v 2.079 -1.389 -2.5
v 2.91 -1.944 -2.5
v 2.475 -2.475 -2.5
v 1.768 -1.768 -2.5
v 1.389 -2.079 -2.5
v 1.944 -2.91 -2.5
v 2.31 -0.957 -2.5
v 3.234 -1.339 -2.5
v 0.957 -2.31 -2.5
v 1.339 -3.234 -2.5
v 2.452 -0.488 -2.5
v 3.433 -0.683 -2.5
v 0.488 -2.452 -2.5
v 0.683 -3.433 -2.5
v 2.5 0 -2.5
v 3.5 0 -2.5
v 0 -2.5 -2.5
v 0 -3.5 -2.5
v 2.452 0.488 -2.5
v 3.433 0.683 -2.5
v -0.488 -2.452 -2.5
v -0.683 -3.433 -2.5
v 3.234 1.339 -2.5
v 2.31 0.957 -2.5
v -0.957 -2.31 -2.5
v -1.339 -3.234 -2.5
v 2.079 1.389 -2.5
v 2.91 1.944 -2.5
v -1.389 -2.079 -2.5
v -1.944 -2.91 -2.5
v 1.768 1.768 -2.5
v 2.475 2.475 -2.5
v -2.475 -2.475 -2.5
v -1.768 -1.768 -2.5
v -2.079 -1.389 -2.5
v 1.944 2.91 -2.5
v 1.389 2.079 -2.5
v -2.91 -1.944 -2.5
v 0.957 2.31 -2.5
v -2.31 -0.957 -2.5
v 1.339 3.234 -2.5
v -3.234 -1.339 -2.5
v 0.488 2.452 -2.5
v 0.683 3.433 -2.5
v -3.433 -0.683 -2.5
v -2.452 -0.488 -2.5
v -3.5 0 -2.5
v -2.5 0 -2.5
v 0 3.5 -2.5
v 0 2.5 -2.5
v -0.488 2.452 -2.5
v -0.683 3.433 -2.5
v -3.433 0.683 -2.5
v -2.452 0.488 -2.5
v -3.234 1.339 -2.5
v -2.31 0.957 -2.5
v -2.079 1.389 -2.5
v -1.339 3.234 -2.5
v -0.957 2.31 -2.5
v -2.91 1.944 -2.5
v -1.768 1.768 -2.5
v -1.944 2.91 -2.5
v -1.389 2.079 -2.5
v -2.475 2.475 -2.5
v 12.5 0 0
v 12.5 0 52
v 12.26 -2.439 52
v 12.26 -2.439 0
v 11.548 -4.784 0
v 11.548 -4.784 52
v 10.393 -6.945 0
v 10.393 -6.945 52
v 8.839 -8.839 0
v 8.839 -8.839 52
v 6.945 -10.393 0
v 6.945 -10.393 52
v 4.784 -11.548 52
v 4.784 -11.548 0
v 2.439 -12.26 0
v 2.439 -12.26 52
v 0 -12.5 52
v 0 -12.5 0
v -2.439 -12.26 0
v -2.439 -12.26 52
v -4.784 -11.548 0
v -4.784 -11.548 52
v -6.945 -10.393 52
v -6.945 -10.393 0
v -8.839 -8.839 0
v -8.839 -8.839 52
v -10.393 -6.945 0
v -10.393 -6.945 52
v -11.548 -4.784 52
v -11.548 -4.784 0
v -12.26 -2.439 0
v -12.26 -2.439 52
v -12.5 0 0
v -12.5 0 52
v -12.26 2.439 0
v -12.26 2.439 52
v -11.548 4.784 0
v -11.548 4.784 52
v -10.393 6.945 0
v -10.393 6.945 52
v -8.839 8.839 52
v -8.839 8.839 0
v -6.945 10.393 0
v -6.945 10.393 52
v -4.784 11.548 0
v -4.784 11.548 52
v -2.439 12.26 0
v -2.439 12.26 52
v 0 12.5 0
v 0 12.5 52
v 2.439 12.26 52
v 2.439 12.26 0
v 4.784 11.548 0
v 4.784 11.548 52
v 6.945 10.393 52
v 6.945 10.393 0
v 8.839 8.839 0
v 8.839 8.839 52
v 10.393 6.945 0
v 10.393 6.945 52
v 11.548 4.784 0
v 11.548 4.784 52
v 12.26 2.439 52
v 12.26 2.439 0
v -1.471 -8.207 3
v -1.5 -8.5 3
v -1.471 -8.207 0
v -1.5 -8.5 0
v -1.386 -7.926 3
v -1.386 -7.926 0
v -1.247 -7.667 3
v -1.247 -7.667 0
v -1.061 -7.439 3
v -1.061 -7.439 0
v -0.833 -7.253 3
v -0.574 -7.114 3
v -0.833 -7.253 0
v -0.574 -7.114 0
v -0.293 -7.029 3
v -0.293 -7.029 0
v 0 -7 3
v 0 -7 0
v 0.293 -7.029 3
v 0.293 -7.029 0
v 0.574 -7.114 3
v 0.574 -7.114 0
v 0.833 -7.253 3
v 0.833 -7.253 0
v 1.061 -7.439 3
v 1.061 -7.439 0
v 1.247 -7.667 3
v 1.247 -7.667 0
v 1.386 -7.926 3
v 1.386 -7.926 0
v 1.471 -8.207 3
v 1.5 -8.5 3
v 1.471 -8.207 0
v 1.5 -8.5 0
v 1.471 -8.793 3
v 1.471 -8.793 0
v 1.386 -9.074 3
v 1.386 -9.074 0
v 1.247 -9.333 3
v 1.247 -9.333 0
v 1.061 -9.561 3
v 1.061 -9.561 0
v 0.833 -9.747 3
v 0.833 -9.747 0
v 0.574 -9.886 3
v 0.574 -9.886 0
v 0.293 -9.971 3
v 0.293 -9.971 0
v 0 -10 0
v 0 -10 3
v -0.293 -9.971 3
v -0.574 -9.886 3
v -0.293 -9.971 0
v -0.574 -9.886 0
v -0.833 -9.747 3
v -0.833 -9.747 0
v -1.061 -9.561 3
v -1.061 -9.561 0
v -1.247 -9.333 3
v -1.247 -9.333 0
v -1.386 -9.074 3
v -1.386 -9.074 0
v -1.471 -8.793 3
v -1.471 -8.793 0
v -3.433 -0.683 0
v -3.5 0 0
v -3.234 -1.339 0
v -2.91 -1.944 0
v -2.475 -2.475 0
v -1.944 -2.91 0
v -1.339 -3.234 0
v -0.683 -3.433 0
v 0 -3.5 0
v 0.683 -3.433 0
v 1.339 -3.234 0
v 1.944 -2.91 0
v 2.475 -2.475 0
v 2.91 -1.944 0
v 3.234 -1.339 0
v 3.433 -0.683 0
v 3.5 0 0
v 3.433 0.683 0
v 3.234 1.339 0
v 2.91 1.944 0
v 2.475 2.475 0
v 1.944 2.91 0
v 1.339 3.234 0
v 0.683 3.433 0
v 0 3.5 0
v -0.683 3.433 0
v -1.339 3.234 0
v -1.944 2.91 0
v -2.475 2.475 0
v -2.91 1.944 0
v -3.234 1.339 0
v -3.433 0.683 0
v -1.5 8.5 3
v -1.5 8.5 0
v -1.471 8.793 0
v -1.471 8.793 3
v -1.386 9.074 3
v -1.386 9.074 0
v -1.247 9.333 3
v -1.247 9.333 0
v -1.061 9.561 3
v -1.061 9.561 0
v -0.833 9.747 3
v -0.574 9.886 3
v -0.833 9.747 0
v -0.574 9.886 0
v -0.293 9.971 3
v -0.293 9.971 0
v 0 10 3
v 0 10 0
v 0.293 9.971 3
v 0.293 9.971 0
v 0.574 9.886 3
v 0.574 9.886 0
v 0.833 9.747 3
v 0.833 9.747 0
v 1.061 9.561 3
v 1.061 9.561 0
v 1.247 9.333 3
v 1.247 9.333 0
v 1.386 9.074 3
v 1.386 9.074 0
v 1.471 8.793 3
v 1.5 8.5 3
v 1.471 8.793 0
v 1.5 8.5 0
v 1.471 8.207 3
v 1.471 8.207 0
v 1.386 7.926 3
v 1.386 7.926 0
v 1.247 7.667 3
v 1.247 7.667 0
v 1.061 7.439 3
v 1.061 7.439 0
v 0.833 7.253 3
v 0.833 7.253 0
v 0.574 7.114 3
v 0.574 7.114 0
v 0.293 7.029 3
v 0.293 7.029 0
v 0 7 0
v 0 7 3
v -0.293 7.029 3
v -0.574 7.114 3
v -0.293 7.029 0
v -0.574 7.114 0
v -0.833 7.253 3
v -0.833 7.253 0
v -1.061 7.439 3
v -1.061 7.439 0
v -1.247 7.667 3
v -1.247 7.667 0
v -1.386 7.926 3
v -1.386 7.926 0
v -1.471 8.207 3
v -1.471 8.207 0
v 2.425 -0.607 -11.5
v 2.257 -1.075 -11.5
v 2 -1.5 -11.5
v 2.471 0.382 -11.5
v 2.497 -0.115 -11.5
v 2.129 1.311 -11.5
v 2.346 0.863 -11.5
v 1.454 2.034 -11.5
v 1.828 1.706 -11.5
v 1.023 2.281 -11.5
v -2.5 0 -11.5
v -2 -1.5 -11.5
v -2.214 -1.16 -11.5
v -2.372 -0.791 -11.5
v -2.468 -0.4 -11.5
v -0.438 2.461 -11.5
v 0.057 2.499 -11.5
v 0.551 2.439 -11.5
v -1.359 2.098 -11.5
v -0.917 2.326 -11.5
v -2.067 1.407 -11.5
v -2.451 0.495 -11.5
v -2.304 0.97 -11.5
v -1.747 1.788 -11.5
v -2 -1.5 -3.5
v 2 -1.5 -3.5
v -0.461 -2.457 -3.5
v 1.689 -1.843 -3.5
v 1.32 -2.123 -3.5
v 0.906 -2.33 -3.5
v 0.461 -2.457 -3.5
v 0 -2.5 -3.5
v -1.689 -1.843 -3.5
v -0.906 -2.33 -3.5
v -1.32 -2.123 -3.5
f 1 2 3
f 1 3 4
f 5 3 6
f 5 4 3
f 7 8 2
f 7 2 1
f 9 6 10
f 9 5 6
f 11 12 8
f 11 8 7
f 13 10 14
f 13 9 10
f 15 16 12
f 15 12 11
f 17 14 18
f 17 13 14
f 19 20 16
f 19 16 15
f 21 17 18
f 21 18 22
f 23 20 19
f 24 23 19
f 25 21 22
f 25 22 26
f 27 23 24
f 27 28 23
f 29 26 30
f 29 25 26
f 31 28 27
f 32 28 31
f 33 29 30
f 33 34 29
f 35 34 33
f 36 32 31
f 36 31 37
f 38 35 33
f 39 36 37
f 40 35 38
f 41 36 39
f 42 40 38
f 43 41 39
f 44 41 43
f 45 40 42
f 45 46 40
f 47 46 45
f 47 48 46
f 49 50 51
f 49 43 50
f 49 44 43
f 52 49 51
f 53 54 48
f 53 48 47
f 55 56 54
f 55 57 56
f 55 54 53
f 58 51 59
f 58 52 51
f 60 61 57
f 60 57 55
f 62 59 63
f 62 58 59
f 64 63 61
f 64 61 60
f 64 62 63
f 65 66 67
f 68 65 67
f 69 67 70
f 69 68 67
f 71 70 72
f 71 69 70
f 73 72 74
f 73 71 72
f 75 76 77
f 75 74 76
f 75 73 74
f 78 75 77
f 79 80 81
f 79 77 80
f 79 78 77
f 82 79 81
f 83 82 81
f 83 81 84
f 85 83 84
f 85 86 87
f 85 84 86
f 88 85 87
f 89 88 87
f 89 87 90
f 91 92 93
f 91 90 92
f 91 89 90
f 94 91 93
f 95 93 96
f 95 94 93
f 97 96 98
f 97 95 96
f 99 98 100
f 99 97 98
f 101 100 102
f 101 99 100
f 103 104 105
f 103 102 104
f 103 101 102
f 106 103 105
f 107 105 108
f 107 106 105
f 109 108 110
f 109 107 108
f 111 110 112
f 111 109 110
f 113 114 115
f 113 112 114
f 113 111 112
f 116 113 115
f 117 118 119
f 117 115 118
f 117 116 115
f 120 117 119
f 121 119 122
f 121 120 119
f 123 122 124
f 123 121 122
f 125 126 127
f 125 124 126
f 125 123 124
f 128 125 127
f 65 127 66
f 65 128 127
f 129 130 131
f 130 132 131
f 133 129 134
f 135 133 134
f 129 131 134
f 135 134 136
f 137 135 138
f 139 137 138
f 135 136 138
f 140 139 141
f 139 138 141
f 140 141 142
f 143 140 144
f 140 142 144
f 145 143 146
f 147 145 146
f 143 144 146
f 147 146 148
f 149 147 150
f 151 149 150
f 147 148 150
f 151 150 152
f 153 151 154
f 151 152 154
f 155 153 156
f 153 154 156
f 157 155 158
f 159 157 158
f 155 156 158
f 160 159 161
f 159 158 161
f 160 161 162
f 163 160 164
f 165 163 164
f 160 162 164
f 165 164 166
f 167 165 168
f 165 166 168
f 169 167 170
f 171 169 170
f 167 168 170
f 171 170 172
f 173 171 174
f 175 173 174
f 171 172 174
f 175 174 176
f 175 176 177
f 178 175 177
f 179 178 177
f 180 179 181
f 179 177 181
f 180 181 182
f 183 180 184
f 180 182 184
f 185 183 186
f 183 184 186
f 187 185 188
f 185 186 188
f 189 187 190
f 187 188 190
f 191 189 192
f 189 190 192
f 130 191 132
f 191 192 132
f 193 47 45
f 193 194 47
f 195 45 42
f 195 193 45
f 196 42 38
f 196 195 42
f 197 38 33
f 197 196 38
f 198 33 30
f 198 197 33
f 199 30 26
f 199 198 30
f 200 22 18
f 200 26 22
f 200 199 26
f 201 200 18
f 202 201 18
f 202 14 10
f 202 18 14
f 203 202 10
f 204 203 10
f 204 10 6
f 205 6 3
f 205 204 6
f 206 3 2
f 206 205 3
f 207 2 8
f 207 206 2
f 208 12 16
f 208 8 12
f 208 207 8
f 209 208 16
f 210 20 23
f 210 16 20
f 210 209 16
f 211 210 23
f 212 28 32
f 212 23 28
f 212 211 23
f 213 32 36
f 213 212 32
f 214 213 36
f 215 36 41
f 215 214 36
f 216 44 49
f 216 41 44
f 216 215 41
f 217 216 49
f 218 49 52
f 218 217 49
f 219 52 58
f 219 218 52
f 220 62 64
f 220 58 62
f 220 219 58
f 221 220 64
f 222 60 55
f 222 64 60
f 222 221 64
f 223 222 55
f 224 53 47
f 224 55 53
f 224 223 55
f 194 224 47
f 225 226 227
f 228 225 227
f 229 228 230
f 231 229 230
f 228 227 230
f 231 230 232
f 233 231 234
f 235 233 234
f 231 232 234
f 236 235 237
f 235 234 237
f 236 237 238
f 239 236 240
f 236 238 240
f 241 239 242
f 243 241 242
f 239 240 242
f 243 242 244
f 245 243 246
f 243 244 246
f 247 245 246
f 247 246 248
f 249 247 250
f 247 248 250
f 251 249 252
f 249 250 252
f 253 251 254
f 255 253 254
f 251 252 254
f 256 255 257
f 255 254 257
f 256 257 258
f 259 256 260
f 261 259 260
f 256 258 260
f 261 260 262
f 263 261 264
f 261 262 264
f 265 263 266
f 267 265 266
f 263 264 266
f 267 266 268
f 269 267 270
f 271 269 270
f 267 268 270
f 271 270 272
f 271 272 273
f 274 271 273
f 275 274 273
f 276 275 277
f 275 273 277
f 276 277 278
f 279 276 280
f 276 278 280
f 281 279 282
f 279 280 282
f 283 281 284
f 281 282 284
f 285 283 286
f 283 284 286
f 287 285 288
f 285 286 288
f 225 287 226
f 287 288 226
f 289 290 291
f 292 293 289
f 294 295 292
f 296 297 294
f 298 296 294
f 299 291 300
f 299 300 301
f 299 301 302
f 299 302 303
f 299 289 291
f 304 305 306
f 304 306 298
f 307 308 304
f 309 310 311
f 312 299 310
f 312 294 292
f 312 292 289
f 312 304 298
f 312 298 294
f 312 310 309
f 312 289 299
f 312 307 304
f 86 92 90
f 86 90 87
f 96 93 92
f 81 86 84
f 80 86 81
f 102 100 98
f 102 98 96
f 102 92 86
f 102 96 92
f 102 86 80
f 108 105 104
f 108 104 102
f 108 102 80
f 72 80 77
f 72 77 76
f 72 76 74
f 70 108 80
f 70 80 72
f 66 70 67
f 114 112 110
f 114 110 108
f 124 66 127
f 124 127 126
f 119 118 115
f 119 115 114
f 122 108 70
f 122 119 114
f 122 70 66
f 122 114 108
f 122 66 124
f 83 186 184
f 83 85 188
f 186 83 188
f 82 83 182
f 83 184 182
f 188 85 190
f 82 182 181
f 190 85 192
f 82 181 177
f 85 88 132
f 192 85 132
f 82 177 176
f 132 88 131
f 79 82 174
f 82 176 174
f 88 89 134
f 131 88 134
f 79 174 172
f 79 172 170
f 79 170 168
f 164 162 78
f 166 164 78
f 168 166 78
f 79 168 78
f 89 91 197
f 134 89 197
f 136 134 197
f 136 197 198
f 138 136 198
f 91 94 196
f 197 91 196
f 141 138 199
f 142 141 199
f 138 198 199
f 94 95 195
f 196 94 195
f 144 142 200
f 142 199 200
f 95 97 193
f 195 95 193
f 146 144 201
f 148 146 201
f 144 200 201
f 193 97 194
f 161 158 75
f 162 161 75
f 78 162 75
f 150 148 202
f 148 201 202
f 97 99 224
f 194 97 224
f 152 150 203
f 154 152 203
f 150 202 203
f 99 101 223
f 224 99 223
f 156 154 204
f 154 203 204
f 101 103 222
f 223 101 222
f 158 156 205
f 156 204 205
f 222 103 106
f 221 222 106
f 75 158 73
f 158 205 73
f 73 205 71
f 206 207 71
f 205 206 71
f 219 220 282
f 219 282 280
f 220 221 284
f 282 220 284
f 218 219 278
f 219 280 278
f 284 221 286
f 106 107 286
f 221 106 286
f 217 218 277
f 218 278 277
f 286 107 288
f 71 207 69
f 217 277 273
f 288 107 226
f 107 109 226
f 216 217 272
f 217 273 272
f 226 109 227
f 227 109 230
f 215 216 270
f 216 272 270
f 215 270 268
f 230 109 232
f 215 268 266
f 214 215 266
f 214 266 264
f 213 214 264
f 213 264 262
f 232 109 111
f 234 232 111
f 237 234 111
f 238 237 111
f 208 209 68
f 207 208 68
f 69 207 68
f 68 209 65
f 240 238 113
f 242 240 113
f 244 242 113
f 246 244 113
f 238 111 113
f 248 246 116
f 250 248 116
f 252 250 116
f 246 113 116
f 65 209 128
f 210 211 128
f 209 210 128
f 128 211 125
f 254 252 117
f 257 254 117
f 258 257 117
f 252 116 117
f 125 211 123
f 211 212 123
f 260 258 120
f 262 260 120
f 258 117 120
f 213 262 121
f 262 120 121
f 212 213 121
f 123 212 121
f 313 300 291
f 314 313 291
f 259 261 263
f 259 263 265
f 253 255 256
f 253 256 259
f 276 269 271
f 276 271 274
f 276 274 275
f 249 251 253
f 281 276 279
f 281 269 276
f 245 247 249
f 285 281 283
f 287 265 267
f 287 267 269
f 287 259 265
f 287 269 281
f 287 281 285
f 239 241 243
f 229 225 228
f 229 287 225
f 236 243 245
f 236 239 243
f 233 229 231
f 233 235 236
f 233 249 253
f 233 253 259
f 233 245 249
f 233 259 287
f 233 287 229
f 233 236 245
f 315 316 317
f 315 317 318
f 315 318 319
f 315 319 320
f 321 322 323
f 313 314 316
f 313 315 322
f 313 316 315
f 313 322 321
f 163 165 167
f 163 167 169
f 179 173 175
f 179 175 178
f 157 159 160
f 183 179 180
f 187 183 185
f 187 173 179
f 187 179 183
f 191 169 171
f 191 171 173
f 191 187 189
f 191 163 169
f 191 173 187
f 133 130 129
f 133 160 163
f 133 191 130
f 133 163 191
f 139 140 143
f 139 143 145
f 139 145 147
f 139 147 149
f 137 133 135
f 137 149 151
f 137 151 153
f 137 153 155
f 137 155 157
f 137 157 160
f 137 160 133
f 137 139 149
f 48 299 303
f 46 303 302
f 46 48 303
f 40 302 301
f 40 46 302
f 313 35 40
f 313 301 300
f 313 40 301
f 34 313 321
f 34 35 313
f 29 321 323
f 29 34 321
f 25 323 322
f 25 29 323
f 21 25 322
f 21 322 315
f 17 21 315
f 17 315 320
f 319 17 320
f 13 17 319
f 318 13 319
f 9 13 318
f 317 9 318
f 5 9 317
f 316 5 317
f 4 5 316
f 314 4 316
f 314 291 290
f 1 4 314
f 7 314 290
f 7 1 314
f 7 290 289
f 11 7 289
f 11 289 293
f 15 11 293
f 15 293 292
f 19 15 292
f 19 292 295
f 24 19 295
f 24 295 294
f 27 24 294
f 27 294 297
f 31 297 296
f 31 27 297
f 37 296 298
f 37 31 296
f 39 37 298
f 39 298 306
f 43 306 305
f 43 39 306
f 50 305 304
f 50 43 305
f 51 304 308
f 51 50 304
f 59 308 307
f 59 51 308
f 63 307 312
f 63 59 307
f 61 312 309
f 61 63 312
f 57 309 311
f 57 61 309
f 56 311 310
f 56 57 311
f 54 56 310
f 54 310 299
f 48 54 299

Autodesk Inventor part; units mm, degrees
ref_plane "YZ Plane" through (0, 0, 0) normal (1, 0, 0) x (0, 1, 0)
ref_plane "XZ Plane" through (0, 0, 0) normal (0, 1, 0) x (-1, 0, 0)
ref_plane "XY Plane" through (0, 0, 0) normal (0, 0, 1) x (1, 0, 0)
sketch "Sketch1" plane through (0, 0, 0) normal (0, 0, 1) x (1, 0, 0)
  circle A0 centre (0, 0) radius 12.5
  dimension "d0" = 25
extrude "Extrusion1" add sketch "Sketch1" along normal blind 52
sketch "Sketch2" plane through (0, 0, 0) normal (0, 0, -1) x (-1, 0, 0)
  circle A0 centre (0, 0) radius 3.5
  dimension "d3" = 7
extrude "Extrusion2" add sketch "Sketch2" along normal blind 2.5
sketch "Sketch3" plane through (0, 0, -2.5) normal (0, 0, -1) x (-1, 0, 0)
  circle A0 centre (0, 0) radius 2.5
  dimension "d6" = 5
extrude "Extrusion3" add sketch "Sketch3" along normal blind 9
sketch "Sketch4" plane through (0, 0, -11.5) normal (0, 0, -1) x (-1, 0, 0)
  line L0 (2, -1.5) -> (-2, -1.5)
  circle A0 centre (0, 0) radius 2.5 projected
  dimension "d9" = 1.5
extrude "Extrusion4" cut sketch "Sketch4" against normal blind 8 contours A0 L0 picked at (-0.534, -1.6398)
sketch "Sketch5" plane through (0, 0, 0) normal (0, 0, -1) x (-1, 0, 0)
  circle A0 centre (0, -8.5) radius 1.5
  circle A1 centre (0, 8.5) radius 1.5
  point P0 (0, 0)
  dimension "d12" = 3
  dimension "d13" = 8.5
  dimension "d14" = 3
  dimension "d15" = 17
extrude "Extrusion5" cut sketch "Sketch5" against normal blind 3
properties part number "Motor" material "Stainless Steel"
